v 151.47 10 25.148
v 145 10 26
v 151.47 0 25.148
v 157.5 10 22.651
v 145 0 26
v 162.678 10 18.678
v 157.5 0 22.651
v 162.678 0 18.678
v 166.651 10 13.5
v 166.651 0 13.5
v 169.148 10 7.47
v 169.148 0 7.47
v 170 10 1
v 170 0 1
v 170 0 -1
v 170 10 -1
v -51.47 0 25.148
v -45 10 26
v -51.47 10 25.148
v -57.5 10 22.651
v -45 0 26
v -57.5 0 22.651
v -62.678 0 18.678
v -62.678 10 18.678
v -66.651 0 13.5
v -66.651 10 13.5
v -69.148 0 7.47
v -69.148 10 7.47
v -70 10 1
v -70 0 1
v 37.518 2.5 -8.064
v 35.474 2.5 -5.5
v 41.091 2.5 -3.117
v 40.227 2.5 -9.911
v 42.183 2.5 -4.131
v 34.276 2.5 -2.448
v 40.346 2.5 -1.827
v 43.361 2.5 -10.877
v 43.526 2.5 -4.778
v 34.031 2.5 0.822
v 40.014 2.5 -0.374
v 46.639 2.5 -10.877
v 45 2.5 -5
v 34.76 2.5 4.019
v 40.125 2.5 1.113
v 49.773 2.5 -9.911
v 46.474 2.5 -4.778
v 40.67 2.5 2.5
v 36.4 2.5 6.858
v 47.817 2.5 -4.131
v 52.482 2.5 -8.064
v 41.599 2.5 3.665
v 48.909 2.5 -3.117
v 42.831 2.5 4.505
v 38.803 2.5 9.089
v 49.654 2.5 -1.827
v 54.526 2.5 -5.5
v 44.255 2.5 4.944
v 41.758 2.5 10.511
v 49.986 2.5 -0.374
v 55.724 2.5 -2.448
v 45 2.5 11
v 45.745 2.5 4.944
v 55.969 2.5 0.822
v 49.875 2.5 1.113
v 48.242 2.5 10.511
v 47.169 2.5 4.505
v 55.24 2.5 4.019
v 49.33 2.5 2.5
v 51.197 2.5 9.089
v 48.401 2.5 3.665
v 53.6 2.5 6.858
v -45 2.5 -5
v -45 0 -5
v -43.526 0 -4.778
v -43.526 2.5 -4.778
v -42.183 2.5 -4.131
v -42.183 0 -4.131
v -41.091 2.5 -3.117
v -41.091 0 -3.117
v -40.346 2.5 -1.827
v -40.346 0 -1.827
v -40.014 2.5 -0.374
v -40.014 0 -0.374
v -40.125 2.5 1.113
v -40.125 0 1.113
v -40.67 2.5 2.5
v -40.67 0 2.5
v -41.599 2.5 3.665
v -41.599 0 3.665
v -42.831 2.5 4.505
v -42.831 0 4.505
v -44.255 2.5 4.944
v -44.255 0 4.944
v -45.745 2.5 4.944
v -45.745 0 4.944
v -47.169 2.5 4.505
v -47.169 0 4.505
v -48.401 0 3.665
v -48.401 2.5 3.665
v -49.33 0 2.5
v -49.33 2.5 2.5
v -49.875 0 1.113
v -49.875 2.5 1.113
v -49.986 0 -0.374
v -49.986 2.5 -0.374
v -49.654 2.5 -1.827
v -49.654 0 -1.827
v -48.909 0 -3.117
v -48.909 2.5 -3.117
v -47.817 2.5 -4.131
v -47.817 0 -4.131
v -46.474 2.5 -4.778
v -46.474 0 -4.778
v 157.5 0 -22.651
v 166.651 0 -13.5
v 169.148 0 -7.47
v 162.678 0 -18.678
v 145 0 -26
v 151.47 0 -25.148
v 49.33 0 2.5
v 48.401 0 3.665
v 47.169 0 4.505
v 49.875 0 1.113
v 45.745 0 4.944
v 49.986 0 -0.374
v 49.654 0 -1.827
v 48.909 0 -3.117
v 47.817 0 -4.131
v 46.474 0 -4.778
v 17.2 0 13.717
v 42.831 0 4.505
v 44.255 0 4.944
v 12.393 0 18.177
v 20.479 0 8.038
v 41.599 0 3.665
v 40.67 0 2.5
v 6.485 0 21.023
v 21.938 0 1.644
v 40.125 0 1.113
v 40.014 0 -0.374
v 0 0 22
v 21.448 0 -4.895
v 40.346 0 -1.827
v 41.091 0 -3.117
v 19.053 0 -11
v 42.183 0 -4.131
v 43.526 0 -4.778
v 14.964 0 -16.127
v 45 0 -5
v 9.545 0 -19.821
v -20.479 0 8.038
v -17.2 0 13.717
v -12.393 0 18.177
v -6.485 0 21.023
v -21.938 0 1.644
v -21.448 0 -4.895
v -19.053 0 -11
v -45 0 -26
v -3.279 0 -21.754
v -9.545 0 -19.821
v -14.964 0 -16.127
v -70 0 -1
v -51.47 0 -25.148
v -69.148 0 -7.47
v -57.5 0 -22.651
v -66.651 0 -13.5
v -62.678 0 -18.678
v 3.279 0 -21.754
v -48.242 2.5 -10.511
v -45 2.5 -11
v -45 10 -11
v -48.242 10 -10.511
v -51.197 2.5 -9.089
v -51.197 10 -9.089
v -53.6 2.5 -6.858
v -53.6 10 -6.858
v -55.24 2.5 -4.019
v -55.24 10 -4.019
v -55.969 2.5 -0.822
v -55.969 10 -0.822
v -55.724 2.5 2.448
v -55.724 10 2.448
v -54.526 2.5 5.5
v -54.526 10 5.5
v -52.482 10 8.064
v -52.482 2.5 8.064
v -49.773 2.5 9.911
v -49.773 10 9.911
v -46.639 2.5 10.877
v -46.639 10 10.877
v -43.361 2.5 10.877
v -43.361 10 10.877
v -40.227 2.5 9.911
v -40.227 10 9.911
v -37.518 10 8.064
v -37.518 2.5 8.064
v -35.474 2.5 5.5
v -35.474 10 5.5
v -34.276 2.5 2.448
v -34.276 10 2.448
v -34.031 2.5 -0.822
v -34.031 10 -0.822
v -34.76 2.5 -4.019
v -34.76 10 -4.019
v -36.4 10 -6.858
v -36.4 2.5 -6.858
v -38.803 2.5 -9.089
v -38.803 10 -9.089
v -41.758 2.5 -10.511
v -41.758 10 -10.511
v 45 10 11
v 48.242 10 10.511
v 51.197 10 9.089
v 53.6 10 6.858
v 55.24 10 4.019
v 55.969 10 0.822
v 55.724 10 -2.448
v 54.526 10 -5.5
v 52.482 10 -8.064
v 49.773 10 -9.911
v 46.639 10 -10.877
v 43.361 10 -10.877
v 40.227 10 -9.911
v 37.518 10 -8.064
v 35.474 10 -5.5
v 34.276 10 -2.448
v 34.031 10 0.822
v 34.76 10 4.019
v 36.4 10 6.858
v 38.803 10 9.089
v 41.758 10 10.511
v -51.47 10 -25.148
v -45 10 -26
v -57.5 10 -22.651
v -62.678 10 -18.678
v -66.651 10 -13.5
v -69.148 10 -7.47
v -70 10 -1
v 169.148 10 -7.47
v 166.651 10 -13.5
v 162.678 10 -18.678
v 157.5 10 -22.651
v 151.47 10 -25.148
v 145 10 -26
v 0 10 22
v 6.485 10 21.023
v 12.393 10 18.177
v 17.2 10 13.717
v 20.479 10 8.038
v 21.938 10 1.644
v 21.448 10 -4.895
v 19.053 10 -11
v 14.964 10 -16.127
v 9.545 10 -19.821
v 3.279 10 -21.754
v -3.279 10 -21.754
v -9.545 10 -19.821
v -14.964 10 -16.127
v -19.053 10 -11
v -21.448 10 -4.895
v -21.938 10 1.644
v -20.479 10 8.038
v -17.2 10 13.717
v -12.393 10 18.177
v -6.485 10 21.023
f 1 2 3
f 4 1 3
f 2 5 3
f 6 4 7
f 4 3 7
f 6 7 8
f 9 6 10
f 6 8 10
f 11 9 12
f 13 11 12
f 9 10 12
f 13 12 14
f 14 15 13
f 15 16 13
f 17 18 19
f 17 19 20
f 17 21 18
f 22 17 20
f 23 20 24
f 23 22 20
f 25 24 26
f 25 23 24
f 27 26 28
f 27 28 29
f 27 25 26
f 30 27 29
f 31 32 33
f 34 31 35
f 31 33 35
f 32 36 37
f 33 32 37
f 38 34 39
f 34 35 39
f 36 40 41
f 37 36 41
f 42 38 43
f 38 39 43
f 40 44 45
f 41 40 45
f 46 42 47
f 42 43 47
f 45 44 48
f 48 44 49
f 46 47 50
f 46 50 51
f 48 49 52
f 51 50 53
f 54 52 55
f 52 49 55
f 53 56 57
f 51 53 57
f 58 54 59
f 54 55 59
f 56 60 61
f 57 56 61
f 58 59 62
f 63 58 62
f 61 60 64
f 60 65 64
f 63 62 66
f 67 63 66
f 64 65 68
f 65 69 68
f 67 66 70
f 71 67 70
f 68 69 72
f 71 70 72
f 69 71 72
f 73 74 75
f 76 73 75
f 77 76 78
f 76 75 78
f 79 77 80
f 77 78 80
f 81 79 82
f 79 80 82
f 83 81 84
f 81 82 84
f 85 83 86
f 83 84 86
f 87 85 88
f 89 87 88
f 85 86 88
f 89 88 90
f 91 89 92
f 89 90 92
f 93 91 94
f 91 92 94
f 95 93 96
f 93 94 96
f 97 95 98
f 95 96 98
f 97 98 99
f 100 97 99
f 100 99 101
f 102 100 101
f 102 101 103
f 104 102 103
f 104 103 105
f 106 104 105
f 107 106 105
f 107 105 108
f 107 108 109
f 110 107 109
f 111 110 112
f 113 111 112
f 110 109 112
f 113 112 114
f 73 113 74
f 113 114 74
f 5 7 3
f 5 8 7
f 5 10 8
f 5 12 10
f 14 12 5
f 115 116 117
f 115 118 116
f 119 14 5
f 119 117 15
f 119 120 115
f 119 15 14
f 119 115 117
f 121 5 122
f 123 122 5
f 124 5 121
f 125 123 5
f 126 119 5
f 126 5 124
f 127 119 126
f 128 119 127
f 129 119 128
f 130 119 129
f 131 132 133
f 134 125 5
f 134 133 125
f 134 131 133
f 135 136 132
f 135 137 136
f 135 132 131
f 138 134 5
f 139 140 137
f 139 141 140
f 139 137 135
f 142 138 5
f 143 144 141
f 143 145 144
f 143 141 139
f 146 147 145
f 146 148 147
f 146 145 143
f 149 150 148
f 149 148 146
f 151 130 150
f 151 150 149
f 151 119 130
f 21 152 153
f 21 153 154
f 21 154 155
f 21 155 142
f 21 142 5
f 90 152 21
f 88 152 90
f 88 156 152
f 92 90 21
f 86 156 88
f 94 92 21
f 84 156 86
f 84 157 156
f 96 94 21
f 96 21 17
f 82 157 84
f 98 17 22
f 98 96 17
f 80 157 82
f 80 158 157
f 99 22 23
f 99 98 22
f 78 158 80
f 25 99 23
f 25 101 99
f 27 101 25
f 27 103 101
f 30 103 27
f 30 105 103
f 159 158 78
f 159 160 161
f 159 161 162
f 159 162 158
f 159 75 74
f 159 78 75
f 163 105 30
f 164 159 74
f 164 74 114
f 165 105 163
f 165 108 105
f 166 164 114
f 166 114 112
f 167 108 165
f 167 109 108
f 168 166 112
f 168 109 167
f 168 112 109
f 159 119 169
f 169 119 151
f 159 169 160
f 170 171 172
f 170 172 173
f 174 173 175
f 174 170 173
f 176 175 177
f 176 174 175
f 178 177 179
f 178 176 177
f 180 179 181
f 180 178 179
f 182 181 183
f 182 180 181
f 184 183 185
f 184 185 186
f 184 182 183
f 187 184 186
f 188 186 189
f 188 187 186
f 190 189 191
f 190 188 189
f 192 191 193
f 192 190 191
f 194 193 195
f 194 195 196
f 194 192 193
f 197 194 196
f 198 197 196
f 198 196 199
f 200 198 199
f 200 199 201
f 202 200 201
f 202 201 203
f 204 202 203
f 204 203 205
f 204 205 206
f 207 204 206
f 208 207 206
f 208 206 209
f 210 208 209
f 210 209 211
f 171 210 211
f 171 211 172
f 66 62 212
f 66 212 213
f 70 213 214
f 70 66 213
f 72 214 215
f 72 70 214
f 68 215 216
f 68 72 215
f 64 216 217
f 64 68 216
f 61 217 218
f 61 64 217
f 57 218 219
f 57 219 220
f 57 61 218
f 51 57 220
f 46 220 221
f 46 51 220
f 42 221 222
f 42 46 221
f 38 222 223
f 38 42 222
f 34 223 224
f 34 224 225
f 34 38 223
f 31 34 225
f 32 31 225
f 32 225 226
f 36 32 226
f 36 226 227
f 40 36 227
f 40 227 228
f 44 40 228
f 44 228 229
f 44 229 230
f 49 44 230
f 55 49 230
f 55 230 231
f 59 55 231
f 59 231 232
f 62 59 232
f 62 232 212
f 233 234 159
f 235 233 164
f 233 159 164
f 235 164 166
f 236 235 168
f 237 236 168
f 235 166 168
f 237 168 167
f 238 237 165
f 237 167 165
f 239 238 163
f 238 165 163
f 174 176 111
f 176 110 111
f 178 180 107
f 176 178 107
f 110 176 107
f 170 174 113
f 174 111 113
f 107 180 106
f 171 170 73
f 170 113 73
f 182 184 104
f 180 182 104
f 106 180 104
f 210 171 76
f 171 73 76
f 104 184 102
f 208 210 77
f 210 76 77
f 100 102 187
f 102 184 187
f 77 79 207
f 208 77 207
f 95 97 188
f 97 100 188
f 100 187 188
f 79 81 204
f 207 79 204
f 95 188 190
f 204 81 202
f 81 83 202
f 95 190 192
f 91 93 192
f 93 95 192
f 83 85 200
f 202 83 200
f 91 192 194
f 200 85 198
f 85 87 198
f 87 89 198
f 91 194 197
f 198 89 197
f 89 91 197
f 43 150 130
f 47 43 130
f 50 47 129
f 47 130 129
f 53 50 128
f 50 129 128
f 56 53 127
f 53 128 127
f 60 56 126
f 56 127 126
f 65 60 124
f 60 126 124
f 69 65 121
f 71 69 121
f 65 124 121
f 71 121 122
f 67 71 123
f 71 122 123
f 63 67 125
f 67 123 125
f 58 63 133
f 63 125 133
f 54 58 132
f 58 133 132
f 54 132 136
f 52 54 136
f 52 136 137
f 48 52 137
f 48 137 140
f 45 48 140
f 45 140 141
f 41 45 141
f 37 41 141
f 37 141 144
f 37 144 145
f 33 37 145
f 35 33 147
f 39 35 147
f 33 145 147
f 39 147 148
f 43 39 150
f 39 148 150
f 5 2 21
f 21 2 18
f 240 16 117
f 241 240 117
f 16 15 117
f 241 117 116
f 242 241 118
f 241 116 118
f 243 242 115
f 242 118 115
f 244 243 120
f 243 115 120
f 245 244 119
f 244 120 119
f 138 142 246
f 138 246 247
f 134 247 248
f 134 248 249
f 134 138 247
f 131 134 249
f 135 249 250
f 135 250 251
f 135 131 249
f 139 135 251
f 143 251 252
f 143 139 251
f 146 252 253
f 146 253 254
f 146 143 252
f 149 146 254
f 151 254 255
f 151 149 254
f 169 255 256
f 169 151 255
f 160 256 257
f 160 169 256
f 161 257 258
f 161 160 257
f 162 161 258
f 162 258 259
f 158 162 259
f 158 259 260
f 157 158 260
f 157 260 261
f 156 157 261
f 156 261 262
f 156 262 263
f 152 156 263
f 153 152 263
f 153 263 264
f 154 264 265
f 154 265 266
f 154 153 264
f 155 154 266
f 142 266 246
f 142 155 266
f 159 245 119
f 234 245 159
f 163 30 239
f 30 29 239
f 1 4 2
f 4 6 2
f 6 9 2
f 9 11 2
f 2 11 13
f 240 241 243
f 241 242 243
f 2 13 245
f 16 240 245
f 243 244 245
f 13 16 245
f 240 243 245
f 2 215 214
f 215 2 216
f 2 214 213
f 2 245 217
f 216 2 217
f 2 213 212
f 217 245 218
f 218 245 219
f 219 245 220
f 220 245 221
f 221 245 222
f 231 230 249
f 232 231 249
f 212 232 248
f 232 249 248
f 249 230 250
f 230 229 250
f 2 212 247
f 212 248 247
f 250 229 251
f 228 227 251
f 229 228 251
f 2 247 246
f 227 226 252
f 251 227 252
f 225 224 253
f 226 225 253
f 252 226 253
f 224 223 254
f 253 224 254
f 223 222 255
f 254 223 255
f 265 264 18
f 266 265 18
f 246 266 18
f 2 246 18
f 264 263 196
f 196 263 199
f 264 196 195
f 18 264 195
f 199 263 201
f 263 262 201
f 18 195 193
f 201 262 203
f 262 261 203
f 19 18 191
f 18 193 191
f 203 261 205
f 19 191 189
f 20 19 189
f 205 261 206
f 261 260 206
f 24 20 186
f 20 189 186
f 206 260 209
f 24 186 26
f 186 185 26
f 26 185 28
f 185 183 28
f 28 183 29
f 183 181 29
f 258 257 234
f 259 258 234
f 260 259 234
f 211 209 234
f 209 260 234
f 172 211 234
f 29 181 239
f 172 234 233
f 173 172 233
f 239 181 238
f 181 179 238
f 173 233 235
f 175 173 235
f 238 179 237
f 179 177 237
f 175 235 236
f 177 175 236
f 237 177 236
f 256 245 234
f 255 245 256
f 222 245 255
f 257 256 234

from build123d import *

# Parameters (mm, degrees)
SKETCH1_R           = 11
SKETCH1_R_2         = 22
BOSS_EXTRUDE1_DEPTH = 10
BOSS_EXTRUDE4_DEPTH = 10
CUT_EXTRUDE1_DEPTH  = 10
BOSS_EXTRUDE5_DEPTH = 10
BOSS_EXTRUDE6_DEPTH = 10
SKETCH2_R           = 12.791308891
SKETCH2_R_2         = 5
SKETCH2_R_3         = 12.648974484
BOSS_EXTRUDE2_DEPTH = 2.5
CUT_EXTRUDE2_DEPTH  = 10
FILLET1_R           = 25
BOSS_EXTRUDE7_DEPTH = 10
FILLET2_R           = 25
FILLET3_R           = 25
CUT_EXTRUDE5_DEPTH  = 10
BOSS_EXTRUDE8_DEPTH = 10
BOSS_EXTRUDE9_DEPTH = 10
FILLET4_R           = 25


with BuildPart() as part:
    # Sketch1 → Boss-Extrude1 (new body)
    with BuildSketch(Plane(origin=(0, 0, 0), x_dir=(1, 0, 0), z_dir=(0, 1, 0))):
        with BuildLine():
            Line((-70, -27), (-25, -27))
            Line((-25, -27), (25, -27))
            Line((25, -27), (70, -27))
            Line((70, -27), (70, 0))
            ThreePointArc((70, 0), (62.67766953, 17.67766953), (45, 25))
            Line((45, 25), (-45, 25))
            ThreePointArc((-45, 25), (-62.67766953, 17.67766953), (-70, 0))
            Line((-70, 0), (-70, -27))
        make_face()
        with Locations(Location((-45, 0, 0), (0, 0, 90))):  # turned: the seam where the file's is
            Circle(SKETCH1_R, mode=Mode.SUBTRACT)
        with Locations(Location((0, 0, 0), (0, 0, 270))):  # turned: the seam where the file's is
            Circle(SKETCH1_R_2, mode=Mode.SUBTRACT)
        with Locations(Location((45, 0, 0), (0, 0, 270))):  # turned: the seam where the file's is
            Circle(SKETCH1_R, mode=Mode.SUBTRACT)
    extrude(amount=BOSS_EXTRUDE1_DEPTH)

    # Sketch3_2 → Boss-Extrude4 (add)
    with BuildSketch(Plane(origin=(0, 10, 0), x_dir=(1, 0, 0), z_dir=(0, 1, 0))):
        Polygon((-70, -27), (-121.413521395, -27), (-121.413521395, 25), (-45, 25), (-60.069243324, 8.259929081), align=None)
    extrude(amount=-BOSS_EXTRUDE4_DEPTH)

    # Sketch3 → Cut-Extrude1 (cut)
    with BuildSketch(Plane(origin=(0, 10, 0), x_dir=(1, 0, 0), z_dir=(0, 1, 0))):
        Polygon((-70, -27), (-121.413521395, -27), (-121.413521395, 25), (-45, 25), (-60.069243324, 8.259929081), align=None)
    extrude(amount=-CUT_EXTRUDE1_DEPTH, mode=Mode.SUBTRACT)

    # Sketch5 → Boss-Extrude5 (add)
    with BuildSketch(Plane(origin=(0, 10, 0), x_dir=(1, 0, 0), z_dir=(0, 1, 0))):
        Polygon((-70, -27), (-152.396081637, -27), (-152.396081637, 25), (-45, 25), (-47.056495807, 18.199026423), (-57.650043642, 5.920141433), (-62.706055109, -17.674578746), align=None)
    extrude(amount=-BOSS_EXTRUDE5_DEPTH)

    # Sketch6 → Boss-Extrude6 (add)
    with BuildSketch(Plane(origin=(0, 10, 0), x_dir=(1, 0, 0), z_dir=(0, 1, 0))):
        Polygon((-170, -27), (-147.259885351, -27), (-136.049250897, -7.734745997), (-143.609911342, 12.600823478), (-152.396081637, 25), (-170, 25), align=None)
    extrude(amount=-BOSS_EXTRUDE6_DEPTH)

    # Sketch2 → Boss-Extrude2 (add)
    with BuildSketch(Plane.XZ):
        with Locations((-45, 0)):
            Circle(SKETCH2_R)
        with Locations(Location((-45, 0, 0), (0, 0, 270))):  # turned: the seam where the file's is
            Circle(SKETCH2_R_2, mode=Mode.SUBTRACT)
        with Locations((45, 0)):
            Circle(SKETCH2_R_3)
        with Locations(Location((45, 0, 0), (0, 0, 270))):  # turned: the seam where the file's is
            Circle(SKETCH2_R_2, mode=Mode.SUBTRACT)
    extrude(amount=-BOSS_EXTRUDE2_DEPTH)

    # Sketch7 → Cut-Extrude2 (cut)
    with BuildSketch(Plane(origin=(0, 10, 0), x_dir=(1, 0, 0), z_dir=(0, 1, 0))):
        Polygon((-70, -27), (-70, 25), (-80.950376598, 84.263900648), (-214.684311222, 75.641343309), (-217.522149123, -21.969417176), (-150.276663253, -84.577260073), align=None)
    extrude(amount=-CUT_EXTRUDE2_DEPTH, mode=Mode.SUBTRACT)

    # Fillet1
    fillet1_edges = [part.edges().sort_by_distance(p)[0] for p in [
        (-70, 5, -25),
    ]]
    fillet(fillet1_edges, radius=FILLET1_R)

    # Sketch8 → Boss-Extrude7 (add)
    with BuildSketch(Plane(origin=(0, 10, 0), x_dir=(1, 0, 0), z_dir=(0, 1, 0))):
        Polygon((45, 25), (170, 25), (170, -27), (70, -27), (59.971259961, 0), align=None)
    extrude(amount=-BOSS_EXTRUDE7_DEPTH)

    # Fillet2
    fillet2_edges = [part.edges().sort_by_distance(p)[0] for p in [
        (170, 5, -25),
    ]]
    fillet(fillet2_edges, radius=FILLET2_R)

    # Fillet3
    fillet3_edges = [part.edges().sort_by_distance(p)[0] for p in [
        (-70, 5, 27),
        (170, 5, 27),
    ]]
    fillet(fillet3_edges, radius=FILLET3_R)

    # Sketch9 → Cut-Extrude5 (cut)
    with BuildSketch(Plane(origin=(0, 10, 0), x_dir=(1, 0, 0), z_dir=(0, 1, 0))):
        with BuildLine():
            Line((168.265391903, -53.084180291), (170, -26))
            Line((170, -26), (152, -26))
            ThreePointArc((152, -26), (148.535533906, -26.748737342), (145, -27))
            Line((145, -27), (-45, -27))
            ThreePointArc((-45, -27), (-48.535533906, -26.748737342), (-52, -26))
            Line((-52, -26), (-70, -26))
            Line((-70, -26), (-6.059888958, -84.123320181))
            Line((-6.059888958, -84.123320181), (168.265391903, -53.084180291))
        make_face()
        with BuildLine():
            ThreePointArc((145, -27), (148.535533906, -26.748737342), (152, -26))
            Line((152, -26), (-52, -26))
            ThreePointArc((-52, -26), (-48.535533906, -26.748737342), (-45, -27))
            Line((-45, -27), (145, -27))
        make_face()
    extrude(amount=-CUT_EXTRUDE5_DEPTH, mode=Mode.SUBTRACT)

    # Sketch10 → Boss-Extrude8 (add)
    with BuildSketch(Plane(origin=(0, 10, 0), x_dir=(1, 0, 0), z_dir=(0, 1, 0))):
        with BuildLine():
            Line((-14.39135104, -23.974647324), (-57.930920378, -15.319190769))
            Line((-57.930920378, -15.319190769), (-70, 0))
            Line((-70, 0), (-70, -2))
            ThreePointArc((-70, -2), (-65, -17), (-52, -26))
            Line((-52, -26), (152, -26))
            ThreePointArc((152, -26), (165, -17), (170, -2))
            Line((170, -2), (170, 0))
            Line((170, 0), (125.93195978, -21.351781701))
            Line((125.93195978, -21.351781701), (-14.39135104, -23.974647324))
        make_face()
        with BuildLine():
            Line((170, -26), (170, -2))
            ThreePointArc((170, -2), (165, -17), (152, -26))
            Line((152, -26), (170, -26))
        make_face()
        with BuildLine():
            ThreePointArc((-52, -26), (-65, -17), (-70, -2))
            Line((-70, -2), (-70, -26))
            Line((-70, -26), (-52, -26))
        make_face()
    extrude(amount=-BOSS_EXTRUDE8_DEPTH)

    # Sketch11 → Boss-Extrude9 (add)
    with BuildSketch(Plane(origin=(0, 10, 0), x_dir=(1, 0, 0), z_dir=(0, 1, 0))):
        with BuildLine():
            Line((-57.382853391, 13.015294561), (-70, 0))
            ThreePointArc((-70, 0), (-62.67766953, 17.67766953), (-45, 25))
            Line((-45, 25), (145, 25))
            ThreePointArc((145, 25), (162.67766953, 17.67766953), (170, 0))
            Line((170, 0), (115.178210727, 18.515775765))
            Line((115.178210727, 18.515775765), (14.984743936, 21.925501075))
            Line((14.984743936, 21.925501075), (-3.225773035, 23.26883074))
            Line((-3.225773035, 23.26883074), (-31.681488845, 16.787813616))
            Line((-31.681488845, 16.787813616), (-57.382853391, 13.015294561))
        make_face()
        with BuildLine():
            Line((170, 0), (170, 26))
            Line((170, 26), (-70, 26))
            Line((-70, 26), (-70, 0))
            ThreePointArc((-70, 0), (-62.67766953, 17.67766953), (-45, 25))
            Line((-45, 25), (145, 25))
            ThreePointArc((145, 25), (162.67766953, 17.67766953), (170, 0))
        make_face()
    extrude(amount=-BOSS_EXTRUDE9_DEPTH)

    # Fillet4
    fillet4_edges = [part.edges().sort_by_distance(p)[0] for p in [
        (170, 5, 26),
        (-70, 5, 26),
        (-70, 5, -26),
        (170, 5, -26),
    ]]
    fillet(fillet4_edges, radius=FILLET4_R)


solid = part.part
